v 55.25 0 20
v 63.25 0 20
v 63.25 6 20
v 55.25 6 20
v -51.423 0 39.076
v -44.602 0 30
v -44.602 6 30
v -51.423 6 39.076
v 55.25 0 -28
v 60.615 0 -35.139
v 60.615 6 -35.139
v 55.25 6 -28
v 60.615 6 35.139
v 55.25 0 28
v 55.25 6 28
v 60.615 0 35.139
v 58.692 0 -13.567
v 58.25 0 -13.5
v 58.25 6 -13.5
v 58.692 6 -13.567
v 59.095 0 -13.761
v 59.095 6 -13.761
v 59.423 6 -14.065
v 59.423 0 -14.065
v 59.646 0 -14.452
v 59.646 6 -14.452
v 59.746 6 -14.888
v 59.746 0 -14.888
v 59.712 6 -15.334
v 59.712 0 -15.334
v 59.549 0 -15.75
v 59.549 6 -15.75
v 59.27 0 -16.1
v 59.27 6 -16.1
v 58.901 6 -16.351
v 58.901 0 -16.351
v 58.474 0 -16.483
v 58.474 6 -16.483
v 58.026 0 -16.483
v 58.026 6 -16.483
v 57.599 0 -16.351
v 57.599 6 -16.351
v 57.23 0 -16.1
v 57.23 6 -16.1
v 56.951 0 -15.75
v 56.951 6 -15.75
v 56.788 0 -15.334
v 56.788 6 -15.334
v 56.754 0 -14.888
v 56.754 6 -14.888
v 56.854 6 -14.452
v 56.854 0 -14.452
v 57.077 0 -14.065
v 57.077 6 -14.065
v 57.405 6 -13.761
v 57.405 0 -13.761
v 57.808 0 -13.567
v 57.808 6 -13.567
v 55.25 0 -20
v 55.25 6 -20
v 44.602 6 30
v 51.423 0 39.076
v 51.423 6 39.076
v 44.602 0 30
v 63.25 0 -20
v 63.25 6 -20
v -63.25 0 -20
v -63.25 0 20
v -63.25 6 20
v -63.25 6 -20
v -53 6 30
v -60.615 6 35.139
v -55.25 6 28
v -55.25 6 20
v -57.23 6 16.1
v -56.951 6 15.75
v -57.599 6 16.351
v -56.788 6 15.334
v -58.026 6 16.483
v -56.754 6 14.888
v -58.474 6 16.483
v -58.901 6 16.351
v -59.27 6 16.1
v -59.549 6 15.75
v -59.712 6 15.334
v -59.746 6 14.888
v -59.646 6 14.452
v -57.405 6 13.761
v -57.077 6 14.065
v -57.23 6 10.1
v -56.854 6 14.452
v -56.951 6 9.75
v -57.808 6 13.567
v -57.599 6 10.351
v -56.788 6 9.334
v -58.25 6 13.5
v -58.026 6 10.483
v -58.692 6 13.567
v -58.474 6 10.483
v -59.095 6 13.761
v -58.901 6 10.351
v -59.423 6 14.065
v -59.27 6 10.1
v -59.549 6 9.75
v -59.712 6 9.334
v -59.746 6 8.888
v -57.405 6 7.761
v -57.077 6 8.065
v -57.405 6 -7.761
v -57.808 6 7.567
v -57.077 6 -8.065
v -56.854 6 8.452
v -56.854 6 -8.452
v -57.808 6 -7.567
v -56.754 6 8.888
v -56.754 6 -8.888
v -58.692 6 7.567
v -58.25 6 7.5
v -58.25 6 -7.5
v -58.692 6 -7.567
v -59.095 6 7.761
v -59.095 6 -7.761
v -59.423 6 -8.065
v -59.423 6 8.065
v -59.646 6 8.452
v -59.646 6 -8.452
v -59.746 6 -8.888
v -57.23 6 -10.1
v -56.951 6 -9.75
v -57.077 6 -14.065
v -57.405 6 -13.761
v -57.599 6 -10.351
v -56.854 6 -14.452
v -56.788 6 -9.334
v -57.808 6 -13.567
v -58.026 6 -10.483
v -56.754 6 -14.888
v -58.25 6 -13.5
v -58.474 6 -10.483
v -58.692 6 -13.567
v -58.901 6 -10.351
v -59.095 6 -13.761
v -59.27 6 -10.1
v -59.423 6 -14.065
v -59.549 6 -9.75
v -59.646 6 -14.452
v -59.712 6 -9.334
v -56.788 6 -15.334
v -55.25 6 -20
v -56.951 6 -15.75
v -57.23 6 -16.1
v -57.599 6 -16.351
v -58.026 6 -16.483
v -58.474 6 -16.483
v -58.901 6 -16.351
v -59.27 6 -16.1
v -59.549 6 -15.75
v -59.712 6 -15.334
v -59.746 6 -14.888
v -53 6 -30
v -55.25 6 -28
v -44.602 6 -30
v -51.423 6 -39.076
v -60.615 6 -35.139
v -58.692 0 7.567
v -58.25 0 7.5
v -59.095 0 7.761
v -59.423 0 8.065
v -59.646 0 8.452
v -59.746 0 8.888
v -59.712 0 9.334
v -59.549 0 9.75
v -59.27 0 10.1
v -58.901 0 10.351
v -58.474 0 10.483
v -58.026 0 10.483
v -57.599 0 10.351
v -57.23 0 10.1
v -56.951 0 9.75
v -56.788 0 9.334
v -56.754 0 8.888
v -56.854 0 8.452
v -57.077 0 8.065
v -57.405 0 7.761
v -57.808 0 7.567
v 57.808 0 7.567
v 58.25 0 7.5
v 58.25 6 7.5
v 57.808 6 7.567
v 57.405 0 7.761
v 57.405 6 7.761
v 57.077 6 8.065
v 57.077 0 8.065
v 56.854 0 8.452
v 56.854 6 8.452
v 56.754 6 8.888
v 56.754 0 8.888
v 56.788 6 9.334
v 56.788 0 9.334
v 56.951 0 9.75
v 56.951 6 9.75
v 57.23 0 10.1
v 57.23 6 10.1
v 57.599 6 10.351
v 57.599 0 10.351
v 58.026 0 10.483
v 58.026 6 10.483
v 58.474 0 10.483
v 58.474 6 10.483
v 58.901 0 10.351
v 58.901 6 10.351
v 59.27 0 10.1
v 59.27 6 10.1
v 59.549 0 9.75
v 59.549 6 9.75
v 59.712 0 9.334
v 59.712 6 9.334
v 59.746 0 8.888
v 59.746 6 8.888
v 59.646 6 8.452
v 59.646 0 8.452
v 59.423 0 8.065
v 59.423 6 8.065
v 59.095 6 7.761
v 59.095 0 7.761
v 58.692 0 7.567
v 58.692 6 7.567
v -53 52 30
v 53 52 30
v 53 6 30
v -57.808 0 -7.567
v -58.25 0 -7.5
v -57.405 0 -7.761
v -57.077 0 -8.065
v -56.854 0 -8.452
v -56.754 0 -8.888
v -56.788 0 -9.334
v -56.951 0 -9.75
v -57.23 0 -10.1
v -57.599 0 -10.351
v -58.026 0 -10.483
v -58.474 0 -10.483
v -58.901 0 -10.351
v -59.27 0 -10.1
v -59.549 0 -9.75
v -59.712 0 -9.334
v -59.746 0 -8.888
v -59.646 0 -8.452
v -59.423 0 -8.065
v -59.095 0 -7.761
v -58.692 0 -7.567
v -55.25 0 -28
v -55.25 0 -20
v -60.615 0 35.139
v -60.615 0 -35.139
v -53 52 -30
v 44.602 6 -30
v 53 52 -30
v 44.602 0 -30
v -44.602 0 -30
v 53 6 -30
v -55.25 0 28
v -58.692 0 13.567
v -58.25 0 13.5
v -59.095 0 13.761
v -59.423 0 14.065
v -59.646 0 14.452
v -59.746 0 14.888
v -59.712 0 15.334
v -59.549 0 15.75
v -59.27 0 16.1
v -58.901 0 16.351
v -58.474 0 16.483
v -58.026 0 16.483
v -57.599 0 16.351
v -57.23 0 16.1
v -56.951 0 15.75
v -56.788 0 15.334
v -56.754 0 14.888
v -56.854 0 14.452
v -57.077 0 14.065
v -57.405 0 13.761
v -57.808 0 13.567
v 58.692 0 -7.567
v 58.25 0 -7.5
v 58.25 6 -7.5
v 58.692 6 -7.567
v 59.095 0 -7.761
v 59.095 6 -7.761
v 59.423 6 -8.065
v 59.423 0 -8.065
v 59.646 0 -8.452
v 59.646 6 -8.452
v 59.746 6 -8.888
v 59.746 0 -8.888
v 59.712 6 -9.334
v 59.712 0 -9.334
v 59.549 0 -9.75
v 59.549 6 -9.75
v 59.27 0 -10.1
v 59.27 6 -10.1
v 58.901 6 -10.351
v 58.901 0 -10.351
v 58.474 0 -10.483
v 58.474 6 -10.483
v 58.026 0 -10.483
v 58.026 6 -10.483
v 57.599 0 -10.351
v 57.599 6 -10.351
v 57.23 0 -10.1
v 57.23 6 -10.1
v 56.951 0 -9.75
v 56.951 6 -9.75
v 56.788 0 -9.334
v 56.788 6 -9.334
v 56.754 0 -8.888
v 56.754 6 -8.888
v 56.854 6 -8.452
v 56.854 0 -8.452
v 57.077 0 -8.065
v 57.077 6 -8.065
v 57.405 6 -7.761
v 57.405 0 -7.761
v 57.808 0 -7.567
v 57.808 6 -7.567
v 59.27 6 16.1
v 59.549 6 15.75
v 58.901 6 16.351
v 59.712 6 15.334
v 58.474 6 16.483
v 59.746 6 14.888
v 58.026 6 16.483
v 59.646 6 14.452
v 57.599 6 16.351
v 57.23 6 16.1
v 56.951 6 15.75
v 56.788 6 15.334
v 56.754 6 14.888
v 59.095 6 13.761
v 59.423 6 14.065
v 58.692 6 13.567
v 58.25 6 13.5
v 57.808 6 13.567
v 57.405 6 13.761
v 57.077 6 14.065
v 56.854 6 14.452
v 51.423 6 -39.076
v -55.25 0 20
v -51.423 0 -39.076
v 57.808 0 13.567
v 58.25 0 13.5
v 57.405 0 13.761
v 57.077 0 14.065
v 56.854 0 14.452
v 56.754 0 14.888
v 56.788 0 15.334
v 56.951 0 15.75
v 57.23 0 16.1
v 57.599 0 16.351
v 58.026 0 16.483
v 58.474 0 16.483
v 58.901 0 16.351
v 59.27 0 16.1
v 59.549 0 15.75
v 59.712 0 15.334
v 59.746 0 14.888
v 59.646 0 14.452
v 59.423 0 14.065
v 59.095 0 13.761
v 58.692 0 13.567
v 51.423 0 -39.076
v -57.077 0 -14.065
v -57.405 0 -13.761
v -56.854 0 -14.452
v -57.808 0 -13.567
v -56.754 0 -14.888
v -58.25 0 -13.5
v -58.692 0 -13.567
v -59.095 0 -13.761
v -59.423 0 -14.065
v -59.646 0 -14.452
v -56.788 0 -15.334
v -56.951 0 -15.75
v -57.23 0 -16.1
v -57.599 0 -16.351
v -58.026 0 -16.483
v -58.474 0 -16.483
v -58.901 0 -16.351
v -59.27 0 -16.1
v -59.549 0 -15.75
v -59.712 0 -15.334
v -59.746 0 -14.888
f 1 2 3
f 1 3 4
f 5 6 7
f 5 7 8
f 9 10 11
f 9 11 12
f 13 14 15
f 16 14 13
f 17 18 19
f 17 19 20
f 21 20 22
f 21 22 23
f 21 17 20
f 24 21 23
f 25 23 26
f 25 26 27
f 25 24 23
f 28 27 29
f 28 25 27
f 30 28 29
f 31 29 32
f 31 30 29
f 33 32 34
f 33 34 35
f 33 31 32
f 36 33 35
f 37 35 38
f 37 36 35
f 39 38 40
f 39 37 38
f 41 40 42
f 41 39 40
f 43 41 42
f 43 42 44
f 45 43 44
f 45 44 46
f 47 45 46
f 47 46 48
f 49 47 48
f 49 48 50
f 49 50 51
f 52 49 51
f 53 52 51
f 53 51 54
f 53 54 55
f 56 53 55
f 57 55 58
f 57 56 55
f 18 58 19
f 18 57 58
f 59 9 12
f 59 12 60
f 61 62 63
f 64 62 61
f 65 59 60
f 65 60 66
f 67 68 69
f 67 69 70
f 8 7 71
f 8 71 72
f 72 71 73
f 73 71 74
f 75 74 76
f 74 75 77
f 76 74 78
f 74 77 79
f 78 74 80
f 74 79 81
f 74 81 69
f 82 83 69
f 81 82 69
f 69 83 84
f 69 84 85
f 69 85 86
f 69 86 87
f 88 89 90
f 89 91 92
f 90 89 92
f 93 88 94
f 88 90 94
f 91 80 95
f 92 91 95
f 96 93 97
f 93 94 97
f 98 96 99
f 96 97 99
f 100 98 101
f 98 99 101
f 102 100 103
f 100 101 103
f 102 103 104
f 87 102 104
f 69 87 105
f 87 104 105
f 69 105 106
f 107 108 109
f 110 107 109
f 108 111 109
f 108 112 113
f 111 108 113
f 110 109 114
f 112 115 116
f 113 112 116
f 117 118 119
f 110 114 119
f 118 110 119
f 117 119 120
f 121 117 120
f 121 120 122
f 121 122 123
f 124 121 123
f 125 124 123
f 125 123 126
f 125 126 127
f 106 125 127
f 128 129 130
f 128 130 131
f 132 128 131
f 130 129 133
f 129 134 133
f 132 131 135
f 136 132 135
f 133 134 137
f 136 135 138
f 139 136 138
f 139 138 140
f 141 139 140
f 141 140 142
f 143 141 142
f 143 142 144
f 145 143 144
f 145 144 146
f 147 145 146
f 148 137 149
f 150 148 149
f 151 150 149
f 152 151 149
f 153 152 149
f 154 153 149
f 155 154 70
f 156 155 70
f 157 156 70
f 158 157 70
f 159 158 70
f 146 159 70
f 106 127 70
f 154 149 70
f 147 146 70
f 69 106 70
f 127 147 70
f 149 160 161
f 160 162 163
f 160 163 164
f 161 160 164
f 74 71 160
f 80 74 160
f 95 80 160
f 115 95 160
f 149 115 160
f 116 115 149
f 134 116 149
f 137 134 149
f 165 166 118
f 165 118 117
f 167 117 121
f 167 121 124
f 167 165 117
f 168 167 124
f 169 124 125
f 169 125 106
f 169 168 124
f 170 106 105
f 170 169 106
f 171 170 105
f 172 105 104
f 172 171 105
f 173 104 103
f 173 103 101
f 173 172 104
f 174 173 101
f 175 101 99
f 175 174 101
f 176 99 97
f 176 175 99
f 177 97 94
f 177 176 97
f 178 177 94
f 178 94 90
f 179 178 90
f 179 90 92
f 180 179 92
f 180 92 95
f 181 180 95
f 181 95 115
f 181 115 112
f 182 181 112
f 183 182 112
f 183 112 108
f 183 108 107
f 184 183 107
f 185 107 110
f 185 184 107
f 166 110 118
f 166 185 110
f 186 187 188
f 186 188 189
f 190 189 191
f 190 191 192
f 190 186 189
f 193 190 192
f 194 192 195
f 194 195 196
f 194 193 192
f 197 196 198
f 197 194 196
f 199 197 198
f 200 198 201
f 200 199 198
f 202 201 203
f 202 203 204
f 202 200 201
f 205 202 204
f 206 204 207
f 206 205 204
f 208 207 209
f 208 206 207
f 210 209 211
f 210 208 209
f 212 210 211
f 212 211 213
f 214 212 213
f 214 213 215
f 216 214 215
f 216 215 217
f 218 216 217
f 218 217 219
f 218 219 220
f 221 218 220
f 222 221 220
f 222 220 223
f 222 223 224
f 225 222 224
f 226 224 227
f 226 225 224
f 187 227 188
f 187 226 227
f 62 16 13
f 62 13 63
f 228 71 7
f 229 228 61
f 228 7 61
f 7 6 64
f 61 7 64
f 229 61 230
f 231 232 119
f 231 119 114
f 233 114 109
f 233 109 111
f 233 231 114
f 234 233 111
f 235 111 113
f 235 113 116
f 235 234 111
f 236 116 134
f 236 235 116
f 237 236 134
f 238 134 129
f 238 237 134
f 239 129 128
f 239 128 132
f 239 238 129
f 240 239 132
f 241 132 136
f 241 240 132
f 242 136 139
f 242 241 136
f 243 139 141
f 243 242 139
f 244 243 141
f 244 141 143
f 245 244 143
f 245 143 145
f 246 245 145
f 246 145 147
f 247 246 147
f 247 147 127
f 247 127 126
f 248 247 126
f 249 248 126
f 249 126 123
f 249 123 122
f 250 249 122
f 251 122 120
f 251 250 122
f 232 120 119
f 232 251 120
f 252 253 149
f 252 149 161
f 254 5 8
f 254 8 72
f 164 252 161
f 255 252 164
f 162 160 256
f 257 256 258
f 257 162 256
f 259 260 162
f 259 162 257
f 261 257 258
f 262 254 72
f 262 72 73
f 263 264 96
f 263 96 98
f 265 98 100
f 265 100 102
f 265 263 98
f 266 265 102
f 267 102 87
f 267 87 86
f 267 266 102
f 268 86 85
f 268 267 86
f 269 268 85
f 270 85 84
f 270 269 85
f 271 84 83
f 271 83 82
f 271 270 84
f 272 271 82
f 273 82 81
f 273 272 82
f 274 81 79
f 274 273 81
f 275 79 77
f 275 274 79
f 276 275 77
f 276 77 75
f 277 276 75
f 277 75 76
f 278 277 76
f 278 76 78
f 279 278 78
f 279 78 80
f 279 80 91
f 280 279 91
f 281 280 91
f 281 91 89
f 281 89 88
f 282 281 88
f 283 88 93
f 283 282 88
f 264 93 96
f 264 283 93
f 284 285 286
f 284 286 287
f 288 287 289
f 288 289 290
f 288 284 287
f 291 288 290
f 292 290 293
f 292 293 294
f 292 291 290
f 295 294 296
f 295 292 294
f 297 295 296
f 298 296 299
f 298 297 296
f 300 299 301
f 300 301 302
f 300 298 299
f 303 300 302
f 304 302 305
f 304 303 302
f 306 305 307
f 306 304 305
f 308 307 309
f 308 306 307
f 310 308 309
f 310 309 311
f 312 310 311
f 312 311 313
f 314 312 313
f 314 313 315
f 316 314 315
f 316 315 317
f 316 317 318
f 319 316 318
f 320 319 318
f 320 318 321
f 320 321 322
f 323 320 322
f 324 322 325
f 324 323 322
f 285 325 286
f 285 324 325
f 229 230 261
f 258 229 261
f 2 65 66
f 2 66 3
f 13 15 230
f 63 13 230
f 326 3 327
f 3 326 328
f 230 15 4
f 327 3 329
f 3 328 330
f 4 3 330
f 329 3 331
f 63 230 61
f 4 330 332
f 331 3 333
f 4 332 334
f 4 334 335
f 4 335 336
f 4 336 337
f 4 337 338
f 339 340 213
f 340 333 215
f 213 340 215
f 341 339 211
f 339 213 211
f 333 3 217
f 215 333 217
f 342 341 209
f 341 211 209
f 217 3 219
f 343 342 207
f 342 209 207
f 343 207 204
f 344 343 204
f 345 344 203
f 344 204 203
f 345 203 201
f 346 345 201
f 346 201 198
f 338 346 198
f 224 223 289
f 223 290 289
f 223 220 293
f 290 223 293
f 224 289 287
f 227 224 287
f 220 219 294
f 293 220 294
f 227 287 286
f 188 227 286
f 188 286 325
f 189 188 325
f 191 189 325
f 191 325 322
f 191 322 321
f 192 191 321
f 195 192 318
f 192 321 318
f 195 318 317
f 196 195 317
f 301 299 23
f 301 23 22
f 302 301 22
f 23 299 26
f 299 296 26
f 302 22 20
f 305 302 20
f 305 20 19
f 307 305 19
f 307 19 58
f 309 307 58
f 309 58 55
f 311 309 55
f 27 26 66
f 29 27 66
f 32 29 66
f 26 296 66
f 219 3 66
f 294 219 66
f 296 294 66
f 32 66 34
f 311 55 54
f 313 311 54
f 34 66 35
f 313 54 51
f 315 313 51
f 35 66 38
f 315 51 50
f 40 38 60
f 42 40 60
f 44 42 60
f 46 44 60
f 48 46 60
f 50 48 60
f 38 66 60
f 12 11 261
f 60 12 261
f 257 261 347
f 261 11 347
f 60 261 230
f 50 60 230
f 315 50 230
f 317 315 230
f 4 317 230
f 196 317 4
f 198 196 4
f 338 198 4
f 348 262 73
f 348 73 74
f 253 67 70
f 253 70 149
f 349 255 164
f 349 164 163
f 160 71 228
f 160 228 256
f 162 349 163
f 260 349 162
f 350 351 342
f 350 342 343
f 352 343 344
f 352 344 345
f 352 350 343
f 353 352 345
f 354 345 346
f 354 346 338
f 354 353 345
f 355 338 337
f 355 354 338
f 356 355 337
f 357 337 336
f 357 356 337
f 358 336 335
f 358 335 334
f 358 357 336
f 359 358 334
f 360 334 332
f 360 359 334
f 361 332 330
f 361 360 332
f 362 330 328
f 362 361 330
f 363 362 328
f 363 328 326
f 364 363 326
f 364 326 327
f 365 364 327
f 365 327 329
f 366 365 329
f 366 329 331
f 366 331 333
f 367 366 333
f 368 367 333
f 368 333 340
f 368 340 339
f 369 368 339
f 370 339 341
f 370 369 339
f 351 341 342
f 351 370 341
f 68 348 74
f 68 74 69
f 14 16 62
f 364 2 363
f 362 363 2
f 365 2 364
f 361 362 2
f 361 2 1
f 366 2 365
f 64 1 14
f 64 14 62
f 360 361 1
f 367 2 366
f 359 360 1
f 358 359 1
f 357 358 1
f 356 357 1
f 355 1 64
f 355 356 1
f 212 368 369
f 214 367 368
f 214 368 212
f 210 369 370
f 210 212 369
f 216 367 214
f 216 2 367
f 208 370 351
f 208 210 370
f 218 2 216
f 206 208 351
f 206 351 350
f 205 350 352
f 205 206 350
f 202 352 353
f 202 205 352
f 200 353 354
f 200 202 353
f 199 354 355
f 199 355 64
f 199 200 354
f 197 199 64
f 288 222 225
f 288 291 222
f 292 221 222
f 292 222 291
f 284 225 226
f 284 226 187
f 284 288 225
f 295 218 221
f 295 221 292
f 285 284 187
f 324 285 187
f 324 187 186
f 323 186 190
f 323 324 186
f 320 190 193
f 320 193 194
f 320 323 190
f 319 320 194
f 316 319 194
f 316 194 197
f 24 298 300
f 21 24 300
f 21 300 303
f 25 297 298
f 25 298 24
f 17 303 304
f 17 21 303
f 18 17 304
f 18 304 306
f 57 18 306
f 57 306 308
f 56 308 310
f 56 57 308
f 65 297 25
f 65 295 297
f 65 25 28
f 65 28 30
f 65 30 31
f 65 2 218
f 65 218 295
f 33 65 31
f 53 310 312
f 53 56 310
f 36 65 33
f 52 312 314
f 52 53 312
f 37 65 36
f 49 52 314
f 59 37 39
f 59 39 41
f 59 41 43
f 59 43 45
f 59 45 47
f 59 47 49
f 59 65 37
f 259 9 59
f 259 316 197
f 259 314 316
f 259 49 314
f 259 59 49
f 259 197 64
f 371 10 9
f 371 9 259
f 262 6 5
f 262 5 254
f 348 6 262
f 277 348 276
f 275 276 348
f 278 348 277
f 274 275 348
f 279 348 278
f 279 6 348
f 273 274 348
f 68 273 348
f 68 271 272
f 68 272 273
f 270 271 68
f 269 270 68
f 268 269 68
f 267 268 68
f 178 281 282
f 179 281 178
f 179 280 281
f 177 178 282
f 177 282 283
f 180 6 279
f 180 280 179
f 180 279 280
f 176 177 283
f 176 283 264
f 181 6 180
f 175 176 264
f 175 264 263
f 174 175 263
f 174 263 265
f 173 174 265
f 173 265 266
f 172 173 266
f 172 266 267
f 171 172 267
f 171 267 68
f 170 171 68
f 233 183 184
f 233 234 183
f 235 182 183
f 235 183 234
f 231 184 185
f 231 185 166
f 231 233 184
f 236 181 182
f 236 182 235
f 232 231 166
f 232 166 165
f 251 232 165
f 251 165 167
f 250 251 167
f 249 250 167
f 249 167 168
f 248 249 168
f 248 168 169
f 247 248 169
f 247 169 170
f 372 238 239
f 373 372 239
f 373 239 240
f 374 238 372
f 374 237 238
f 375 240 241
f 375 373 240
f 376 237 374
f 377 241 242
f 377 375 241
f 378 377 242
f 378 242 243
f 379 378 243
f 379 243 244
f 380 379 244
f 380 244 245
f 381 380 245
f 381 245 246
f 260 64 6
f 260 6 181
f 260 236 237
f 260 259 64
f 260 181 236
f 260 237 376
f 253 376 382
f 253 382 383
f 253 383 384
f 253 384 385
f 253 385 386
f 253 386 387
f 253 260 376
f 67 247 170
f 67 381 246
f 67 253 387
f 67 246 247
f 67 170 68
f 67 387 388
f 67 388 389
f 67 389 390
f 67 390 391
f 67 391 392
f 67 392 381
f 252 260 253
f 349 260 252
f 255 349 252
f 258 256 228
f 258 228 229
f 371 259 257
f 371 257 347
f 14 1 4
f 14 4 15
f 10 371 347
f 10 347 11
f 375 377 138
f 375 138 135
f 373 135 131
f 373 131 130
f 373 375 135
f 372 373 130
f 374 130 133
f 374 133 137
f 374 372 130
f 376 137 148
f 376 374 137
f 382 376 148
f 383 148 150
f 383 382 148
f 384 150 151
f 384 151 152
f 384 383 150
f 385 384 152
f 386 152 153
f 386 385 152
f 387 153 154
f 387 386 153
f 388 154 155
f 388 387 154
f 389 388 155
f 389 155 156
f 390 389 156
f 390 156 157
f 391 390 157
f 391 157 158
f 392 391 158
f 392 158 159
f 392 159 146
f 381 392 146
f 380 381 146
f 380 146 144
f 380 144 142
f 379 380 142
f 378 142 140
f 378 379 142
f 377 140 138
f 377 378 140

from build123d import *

# Parameters (mm, degrees)
SKETCH_1_R      = 1.5
EXTRUDE_1_DEPTH = 6
SKETCH_2_W      = 106
SKETCH_2_H      = 60
EXTRUDE_2_DEPTH = 46


with BuildPart() as part:
    # 草图1 → 凸台-拉伸1 (new body)
    with BuildSketch(Plane(origin=(0, 0, 0), x_dir=(1, 0, 0), z_dir=(0, 1, 0))):
        Polygon((44.601753779, -30), (-44.601753779, -30), (-51.423054046, -39.075905643), (-60.615391847, -35.138784137), (-55.25, -28), (-55.25, -20), (-63.25, -20), (-63.25, 20), (-55.25, 20), (-55.25, 28), (-60.615391847, 35.138784137), (-51.423054046, 39.075905643), (-44.601753779, 30), (44.601753779, 30), (51.423054046, 39.075905643), (60.615391847, 35.138784137), (55.25, 28), (55.25, 20), (63.25, 20), (63.25, -20), (55.25, -20), (55.25, -28), (60.615391847, -35.138784137), (51.423054046, -39.075905643), align=None)
        with Locations(Location((58.25, 15, 0), (0, 0, 270))):
            Circle(SKETCH_1_R, mode=Mode.SUBTRACT)
        with Locations(Location((-58.25, 15, 0), (0, 0, 270))):
            Circle(SKETCH_1_R, mode=Mode.SUBTRACT)
        with Locations(Location((58.25, 9, 0), (0, 0, 270))):
            Circle(SKETCH_1_R, mode=Mode.SUBTRACT)
        with Locations(Location((-58.25, 9, 0), (0, 0, 270))):
            Circle(SKETCH_1_R, mode=Mode.SUBTRACT)
        with Locations(Location((58.25, -9, 0), (0, 0, 90))):
            Circle(SKETCH_1_R, mode=Mode.SUBTRACT)
        with Locations(Location((58.25, -15, 0), (0, 0, 90))):
            Circle(SKETCH_1_R, mode=Mode.SUBTRACT)
        with Locations(Location((-58.25, -9, 0), (0, 0, 90))):
            Circle(SKETCH_1_R, mode=Mode.SUBTRACT)
        with Locations(Location((-58.25, -15, 0), (0, 0, 90))):
            Circle(SKETCH_1_R, mode=Mode.SUBTRACT)
    extrude(amount=EXTRUDE_1_DEPTH)

    # 草图2 → 凸台-拉伸2 (add)
    with BuildSketch(Plane(origin=(0, 6, 0), x_dir=(1, 0, 0), z_dir=(0, 1, 0))):
        Rectangle(SKETCH_2_W, SKETCH_2_H)
    extrude(amount=EXTRUDE_2_DEPTH)


solid = part.part
